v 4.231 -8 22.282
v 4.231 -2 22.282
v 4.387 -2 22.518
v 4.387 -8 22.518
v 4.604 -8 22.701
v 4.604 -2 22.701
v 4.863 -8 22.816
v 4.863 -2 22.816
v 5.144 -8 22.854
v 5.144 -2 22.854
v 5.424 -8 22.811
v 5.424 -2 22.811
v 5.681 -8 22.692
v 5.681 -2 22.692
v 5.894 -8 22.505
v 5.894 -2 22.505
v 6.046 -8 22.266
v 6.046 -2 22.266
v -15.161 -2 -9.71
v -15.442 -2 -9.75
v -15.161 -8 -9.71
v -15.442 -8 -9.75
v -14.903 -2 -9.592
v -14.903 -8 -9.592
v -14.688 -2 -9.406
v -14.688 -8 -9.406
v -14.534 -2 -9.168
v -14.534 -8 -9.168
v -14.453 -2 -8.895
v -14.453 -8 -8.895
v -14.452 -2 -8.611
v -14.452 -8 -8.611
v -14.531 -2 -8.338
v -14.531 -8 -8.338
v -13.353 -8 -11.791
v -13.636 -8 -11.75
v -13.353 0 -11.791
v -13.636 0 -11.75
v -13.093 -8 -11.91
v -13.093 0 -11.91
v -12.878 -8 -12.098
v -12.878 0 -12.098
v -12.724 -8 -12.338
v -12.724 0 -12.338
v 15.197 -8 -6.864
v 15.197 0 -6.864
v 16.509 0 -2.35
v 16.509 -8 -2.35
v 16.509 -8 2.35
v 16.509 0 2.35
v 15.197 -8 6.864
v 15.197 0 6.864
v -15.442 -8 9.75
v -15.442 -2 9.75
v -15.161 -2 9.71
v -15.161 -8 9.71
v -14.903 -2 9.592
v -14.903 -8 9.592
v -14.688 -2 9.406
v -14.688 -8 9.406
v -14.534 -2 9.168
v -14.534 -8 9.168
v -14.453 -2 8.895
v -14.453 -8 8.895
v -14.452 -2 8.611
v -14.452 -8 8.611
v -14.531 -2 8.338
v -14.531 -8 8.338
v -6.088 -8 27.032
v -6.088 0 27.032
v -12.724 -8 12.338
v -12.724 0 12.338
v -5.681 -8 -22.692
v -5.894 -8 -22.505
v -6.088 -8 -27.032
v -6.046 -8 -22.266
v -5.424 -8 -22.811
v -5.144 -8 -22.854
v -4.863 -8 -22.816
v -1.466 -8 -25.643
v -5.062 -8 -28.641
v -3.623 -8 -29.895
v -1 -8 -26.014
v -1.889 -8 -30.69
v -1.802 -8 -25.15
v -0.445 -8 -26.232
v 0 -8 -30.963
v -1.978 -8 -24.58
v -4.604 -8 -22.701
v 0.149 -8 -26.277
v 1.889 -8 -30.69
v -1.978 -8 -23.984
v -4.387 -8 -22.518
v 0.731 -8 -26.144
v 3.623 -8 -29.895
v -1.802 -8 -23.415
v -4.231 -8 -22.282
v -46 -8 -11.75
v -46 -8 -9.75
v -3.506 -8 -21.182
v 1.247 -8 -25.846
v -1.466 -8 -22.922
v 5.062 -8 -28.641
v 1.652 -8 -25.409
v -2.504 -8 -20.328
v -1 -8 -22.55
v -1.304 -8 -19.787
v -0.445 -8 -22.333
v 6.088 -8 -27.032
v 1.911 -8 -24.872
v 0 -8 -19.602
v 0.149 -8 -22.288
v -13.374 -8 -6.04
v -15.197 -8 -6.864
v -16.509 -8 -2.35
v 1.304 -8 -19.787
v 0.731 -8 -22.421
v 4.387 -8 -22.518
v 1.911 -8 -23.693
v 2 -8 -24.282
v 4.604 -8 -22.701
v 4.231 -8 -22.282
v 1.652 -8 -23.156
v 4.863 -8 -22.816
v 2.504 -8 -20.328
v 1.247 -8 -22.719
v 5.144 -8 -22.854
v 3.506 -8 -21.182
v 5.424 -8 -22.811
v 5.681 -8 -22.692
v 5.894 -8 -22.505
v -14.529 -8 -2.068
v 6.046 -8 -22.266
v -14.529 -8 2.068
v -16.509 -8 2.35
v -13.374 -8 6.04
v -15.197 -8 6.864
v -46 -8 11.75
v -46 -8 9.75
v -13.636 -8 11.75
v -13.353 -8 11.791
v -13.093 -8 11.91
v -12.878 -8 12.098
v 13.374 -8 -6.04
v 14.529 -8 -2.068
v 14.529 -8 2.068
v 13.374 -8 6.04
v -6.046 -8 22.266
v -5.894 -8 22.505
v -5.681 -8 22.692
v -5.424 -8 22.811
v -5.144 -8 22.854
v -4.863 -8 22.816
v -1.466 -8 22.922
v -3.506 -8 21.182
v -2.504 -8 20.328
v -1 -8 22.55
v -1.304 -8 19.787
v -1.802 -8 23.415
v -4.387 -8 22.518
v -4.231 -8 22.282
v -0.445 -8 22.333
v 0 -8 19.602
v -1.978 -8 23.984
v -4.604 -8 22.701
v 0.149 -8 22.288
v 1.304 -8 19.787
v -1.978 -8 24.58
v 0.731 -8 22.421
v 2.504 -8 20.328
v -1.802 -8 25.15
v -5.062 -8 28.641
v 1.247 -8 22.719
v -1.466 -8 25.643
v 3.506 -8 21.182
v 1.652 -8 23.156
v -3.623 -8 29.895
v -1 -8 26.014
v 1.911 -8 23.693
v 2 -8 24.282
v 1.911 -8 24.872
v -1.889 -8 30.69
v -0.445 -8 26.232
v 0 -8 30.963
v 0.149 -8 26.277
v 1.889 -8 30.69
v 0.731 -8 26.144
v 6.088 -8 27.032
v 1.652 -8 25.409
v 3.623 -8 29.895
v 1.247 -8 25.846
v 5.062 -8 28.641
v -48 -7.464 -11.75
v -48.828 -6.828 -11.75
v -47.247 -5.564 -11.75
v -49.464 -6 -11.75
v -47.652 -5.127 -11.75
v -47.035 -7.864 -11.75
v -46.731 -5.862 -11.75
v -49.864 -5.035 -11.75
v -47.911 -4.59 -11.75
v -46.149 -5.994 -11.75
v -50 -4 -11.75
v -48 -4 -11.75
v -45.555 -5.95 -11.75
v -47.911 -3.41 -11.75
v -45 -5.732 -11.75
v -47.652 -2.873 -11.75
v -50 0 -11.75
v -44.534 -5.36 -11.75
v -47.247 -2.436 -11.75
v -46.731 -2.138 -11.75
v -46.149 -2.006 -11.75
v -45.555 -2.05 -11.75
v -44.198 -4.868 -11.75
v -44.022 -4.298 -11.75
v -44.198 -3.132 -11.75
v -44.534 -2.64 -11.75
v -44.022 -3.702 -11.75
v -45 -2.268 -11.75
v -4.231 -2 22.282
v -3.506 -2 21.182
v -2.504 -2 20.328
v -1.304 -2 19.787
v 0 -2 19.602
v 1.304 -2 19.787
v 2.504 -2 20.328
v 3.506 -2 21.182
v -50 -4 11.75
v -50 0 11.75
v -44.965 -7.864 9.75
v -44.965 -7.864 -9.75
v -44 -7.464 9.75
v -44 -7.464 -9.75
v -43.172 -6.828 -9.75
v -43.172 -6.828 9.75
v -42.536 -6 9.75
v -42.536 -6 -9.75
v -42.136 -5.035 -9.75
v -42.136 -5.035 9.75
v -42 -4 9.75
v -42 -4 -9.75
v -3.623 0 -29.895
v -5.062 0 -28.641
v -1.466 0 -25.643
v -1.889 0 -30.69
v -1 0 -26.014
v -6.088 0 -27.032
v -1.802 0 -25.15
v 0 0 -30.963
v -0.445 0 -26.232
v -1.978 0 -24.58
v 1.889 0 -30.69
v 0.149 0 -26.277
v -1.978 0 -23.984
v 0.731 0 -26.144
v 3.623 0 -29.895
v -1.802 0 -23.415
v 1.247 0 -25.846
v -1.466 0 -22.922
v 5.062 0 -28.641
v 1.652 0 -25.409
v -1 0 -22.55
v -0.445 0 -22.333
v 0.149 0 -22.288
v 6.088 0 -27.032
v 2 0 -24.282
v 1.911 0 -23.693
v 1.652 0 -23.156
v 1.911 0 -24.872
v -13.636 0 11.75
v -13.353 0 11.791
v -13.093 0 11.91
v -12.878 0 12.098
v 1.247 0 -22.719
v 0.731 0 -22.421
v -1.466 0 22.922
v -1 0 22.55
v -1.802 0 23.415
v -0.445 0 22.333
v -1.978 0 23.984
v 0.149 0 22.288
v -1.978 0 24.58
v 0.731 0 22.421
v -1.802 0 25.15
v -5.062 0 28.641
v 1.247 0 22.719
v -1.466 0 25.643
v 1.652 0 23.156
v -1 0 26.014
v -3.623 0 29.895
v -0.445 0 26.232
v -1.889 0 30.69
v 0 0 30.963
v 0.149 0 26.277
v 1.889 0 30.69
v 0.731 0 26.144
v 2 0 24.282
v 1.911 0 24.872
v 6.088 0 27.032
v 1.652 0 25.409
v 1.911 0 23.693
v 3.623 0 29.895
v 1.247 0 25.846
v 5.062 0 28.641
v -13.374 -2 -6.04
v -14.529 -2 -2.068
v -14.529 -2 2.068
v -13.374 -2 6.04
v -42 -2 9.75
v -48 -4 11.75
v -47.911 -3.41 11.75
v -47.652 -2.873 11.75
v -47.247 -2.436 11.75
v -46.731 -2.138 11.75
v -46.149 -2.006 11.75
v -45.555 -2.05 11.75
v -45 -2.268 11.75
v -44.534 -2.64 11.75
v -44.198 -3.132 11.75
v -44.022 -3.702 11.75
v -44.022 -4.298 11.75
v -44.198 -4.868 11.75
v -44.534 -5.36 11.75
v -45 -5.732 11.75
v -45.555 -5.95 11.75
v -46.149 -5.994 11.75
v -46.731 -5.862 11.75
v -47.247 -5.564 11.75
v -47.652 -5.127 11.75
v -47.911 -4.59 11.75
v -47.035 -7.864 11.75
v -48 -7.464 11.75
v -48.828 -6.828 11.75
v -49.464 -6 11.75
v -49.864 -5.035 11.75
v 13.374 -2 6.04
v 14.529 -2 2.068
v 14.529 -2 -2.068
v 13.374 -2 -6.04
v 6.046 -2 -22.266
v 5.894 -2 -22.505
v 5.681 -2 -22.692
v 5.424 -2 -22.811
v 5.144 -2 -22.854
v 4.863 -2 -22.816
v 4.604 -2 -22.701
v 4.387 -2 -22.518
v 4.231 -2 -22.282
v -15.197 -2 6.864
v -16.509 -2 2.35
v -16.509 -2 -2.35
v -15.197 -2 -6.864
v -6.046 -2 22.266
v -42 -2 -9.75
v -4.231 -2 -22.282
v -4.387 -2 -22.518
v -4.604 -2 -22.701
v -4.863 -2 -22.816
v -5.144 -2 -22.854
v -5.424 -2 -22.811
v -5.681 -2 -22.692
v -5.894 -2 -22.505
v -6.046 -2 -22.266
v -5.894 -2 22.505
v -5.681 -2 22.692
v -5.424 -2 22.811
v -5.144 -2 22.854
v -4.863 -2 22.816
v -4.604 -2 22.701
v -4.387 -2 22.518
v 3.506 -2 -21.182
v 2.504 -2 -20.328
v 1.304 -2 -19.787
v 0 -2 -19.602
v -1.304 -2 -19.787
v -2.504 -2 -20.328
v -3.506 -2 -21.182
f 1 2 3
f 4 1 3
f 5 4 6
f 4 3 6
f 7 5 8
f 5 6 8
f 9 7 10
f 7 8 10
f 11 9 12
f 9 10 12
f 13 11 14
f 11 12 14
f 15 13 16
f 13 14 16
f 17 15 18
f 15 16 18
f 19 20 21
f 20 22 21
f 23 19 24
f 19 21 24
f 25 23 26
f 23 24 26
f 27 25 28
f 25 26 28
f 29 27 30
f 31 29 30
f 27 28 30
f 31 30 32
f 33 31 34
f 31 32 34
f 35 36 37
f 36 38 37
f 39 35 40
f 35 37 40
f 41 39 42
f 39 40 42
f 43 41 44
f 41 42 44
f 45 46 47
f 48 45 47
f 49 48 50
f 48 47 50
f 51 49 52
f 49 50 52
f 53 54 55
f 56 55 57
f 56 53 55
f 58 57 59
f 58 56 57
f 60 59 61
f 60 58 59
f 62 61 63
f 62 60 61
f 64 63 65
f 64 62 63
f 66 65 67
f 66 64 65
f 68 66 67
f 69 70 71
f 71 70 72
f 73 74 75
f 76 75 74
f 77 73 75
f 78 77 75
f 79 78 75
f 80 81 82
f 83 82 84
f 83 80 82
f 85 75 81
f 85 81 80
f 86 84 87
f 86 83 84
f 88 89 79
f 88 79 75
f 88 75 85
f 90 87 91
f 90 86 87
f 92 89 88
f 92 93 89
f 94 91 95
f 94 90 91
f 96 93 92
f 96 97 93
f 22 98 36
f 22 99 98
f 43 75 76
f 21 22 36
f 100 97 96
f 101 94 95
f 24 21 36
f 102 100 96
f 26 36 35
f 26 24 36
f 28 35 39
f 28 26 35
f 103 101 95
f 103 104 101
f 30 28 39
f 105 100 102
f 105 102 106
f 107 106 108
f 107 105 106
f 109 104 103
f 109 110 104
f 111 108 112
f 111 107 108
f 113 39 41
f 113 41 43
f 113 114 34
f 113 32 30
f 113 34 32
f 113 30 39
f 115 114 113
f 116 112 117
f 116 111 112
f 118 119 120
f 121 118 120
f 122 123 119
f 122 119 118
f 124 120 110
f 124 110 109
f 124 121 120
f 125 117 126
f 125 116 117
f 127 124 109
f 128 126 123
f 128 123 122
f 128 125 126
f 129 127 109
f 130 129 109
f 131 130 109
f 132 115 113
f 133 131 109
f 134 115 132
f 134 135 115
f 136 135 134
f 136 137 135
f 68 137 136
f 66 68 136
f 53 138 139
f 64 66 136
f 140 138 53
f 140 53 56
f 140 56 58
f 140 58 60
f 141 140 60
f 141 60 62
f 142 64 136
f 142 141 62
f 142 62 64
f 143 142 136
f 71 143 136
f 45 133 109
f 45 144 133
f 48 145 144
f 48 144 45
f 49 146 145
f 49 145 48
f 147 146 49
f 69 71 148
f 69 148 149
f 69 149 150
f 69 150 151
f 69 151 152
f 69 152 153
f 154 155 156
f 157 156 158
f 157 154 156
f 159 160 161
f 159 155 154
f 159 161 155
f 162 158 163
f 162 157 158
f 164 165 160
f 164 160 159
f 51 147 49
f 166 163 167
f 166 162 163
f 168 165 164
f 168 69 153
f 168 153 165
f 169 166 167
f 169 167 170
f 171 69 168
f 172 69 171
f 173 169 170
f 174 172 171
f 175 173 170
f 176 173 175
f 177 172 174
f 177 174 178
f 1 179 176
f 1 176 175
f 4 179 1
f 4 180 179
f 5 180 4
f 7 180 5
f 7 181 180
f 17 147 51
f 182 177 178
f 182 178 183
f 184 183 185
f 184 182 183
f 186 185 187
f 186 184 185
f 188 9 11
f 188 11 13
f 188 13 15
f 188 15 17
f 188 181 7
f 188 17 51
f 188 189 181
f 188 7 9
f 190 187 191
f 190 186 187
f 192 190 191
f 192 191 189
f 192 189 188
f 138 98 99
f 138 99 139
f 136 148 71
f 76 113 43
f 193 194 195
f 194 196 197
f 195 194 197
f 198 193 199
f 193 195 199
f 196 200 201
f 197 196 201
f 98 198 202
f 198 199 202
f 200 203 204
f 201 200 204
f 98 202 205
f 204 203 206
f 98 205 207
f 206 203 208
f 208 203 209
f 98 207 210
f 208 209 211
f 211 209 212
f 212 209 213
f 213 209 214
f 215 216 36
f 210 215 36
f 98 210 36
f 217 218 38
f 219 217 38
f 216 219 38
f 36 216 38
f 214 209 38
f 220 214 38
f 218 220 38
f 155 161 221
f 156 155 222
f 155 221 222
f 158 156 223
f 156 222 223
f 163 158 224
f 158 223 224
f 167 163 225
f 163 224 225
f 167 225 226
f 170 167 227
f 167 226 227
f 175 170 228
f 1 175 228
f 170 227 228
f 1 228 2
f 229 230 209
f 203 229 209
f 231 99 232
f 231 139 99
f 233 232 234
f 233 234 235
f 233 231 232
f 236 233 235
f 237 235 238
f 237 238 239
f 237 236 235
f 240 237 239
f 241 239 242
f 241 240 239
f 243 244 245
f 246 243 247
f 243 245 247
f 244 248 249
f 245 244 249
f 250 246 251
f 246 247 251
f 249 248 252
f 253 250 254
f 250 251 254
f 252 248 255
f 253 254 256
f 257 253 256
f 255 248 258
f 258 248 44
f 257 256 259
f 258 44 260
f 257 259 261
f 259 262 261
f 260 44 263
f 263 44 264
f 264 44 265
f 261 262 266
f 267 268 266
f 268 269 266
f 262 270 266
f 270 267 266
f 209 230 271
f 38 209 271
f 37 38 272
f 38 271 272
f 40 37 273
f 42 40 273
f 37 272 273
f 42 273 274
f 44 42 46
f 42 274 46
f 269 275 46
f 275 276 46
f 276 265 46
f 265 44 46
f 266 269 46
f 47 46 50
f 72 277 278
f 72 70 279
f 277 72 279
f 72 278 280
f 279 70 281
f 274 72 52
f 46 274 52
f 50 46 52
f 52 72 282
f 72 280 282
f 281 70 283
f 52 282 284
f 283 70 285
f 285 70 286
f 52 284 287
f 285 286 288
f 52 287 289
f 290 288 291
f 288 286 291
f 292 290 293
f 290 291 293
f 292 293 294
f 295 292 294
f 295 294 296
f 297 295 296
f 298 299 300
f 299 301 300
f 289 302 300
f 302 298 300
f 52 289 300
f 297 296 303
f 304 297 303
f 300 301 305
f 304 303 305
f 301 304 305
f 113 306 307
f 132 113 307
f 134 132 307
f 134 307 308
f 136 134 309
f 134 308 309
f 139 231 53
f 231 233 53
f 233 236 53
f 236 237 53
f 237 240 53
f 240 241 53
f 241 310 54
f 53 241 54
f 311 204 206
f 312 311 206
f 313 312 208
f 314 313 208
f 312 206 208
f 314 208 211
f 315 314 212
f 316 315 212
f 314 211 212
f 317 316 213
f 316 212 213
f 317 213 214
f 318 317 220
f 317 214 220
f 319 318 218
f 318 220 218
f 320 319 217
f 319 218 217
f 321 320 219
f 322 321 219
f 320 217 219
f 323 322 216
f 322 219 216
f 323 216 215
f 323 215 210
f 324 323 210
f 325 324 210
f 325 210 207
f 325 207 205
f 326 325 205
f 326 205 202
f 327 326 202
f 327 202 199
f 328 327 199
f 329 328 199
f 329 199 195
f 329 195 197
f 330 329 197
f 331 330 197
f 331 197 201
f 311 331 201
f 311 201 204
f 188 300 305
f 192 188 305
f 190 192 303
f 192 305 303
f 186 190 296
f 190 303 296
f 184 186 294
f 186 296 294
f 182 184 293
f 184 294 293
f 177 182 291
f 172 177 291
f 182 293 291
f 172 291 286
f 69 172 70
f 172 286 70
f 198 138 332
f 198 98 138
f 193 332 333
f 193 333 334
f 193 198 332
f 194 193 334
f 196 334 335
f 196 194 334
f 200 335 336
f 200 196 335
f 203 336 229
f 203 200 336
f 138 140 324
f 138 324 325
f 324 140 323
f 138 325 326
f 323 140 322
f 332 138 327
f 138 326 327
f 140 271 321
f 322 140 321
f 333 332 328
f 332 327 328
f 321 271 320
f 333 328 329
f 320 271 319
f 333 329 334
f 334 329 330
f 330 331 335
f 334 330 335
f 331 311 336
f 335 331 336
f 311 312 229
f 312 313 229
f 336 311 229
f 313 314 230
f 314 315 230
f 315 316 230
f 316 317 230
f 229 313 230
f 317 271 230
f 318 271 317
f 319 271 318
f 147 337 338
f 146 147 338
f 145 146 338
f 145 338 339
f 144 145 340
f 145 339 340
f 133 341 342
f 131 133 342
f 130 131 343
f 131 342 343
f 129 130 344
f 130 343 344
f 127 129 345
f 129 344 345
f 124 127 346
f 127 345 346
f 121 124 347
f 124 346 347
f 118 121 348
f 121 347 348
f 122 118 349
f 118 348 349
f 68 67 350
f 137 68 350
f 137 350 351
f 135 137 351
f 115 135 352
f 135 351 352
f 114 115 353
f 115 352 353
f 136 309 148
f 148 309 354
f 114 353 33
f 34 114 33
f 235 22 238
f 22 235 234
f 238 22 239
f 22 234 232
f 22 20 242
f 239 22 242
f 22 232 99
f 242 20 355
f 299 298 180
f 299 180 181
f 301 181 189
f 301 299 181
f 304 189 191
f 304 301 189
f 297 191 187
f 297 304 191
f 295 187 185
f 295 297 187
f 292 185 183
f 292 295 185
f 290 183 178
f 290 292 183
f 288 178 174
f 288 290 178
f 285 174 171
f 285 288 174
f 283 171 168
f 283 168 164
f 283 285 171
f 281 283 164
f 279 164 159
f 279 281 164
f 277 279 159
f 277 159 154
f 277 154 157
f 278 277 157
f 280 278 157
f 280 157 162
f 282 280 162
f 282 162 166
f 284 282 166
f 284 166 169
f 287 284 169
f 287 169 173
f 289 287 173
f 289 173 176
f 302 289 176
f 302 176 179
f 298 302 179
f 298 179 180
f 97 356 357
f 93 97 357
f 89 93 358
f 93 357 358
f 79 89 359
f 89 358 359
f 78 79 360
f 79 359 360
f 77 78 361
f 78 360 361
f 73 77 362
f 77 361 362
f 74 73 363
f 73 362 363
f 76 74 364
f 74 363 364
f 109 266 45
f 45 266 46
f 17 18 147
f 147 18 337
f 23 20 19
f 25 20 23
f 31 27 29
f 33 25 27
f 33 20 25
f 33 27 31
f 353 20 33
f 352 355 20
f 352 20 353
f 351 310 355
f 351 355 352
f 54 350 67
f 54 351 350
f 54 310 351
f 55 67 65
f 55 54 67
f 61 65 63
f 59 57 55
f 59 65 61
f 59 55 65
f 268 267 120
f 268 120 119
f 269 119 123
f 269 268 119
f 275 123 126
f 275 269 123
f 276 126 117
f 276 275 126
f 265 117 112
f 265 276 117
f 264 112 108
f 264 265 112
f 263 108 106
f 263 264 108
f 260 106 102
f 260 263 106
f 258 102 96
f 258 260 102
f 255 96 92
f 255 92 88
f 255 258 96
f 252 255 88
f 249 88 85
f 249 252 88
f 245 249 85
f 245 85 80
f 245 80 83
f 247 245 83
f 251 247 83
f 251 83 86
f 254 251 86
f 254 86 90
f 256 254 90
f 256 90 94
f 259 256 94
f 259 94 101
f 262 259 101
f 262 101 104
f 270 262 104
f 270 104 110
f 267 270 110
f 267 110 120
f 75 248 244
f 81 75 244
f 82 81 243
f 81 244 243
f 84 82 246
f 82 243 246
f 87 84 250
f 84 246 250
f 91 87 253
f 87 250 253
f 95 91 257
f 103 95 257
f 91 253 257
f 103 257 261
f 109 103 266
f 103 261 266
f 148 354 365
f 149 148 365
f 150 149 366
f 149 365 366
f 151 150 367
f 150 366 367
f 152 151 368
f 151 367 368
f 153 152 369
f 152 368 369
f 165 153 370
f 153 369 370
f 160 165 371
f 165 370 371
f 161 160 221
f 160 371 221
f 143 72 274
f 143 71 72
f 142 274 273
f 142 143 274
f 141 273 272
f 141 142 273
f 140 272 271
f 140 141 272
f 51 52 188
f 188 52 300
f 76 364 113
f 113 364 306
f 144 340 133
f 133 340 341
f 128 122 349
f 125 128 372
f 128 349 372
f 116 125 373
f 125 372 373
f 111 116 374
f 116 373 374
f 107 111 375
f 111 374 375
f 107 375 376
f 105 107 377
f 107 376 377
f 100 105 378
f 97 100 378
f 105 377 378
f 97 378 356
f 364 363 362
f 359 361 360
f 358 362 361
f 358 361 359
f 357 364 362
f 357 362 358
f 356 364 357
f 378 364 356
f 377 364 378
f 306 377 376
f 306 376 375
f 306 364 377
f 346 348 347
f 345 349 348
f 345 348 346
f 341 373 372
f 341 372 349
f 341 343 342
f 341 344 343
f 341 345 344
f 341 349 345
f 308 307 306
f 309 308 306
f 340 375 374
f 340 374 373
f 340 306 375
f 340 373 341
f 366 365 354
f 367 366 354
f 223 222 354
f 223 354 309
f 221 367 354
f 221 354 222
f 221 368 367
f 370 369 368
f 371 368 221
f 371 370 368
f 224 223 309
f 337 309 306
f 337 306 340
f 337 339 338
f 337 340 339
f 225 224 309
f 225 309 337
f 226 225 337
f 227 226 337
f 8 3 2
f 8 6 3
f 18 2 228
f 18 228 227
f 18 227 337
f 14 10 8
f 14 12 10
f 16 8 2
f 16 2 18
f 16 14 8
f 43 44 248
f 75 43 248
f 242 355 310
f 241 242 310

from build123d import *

# Parameters (mm, degrees)
F0_R     = 2
F1_DEPTH = 8
F2_DEPTH = 2
F3_R     = 1
F5_D     = 4
F6_R     = 3.99999


# Not quite as in the source:
# - a fillet or chamfer is up to 0.001 mm smaller than in the source, because OpenCascade refuses the exact size
# - a feature names something its author has since deleted; it is built from what else it names


with BuildPart() as f1:
    # F0 (on Front) → F1 (new body)
    with BuildSketch(Plane.XZ):
        with BuildLine():
            Line((15.1970139668, 6.8636525628), (6.0880650012, 27.0320429916))
            ThreePointArc((6.0880650012, 27.0320429916), (0, 30.9626), (-6.0880650012, 27.0320429916))
            Line((-6.0880650012, 27.0320429916), (-12.9901204821, 11.75))
            Line((-12.9901204821, 11.75), (-13.8934101123, 9.75))
            Line((-13.8934101123, 9.75), (-15.1970139668, 6.8636525628))
            ThreePointArc((-15.1970139668, 6.8636525628), (-16.6751, 0), (-15.1970139668, -6.8636525628))
            Line((-15.1970139668, -6.8636525628), (-13.8934101123, -9.75))
            Line((-13.8934101123, -9.75), (-12.9901204821, -11.75))
            Line((-12.9901204821, -11.75), (-6.0880650012, -27.0320429916))
            ThreePointArc((-6.0880650012, -27.0320429916), (0, -30.9626), (6.0880650012, -27.0320429916))
            Line((6.0880650012, -27.0320429916), (15.1970139668, -6.8636525628))
            ThreePointArc((15.1970139668, -6.8636525628), (16.6751, 0), (15.1970139668, 6.8636525628))
        make_face()
        with Locations((0, -24.2824)):
            Circle(F0_R, mode=Mode.SUBTRACT)
        with BuildLine():
            Line((-13.3742945868, 6.0404308054), (-6.0462846285, 22.2655920687))
            ThreePointArc((-6.0462846285, 22.2655920687), (-5.1436901116, 22.8539427752), (-4.2309206889, 22.2815046593))
            ThreePointArc((-4.2309206889, 22.2815046593), (0, 19.6022), (4.2309206889, 22.2815046593))
            ThreePointArc((4.2309206889, 22.2815046593), (5.1436901116, 22.8539427752), (6.0462846285, 22.2655920687))
            Line((6.0462846285, 22.2655920687), (13.3742945868, 6.0404308054))
            ThreePointArc((13.3742945868, 6.0404308054), (14.6751, 0), (13.3742945868, -6.0404308054))
            Line((13.3742945868, -6.0404308054), (6.0462846285, -22.2655920687))
            ThreePointArc((6.0462846285, -22.2655920687), (5.1436901116, -22.8539427752), (4.2309206889, -22.2815046593))
            ThreePointArc((4.2309206889, -22.2815046593), (0, -19.6022), (-4.2309206889, -22.2815046593))
            ThreePointArc((-4.2309206889, -22.2815046593), (-5.1436901116, -22.8539427752), (-6.0462846285, -22.2655920687))
            Line((-6.0462846285, -22.2655920687), (-13.3742945868, -6.0404308054))
            ThreePointArc((-13.3742945868, -6.0404308054), (-14.6751, 0), (-13.3742945868, 6.0404308054))
        make_face(mode=Mode.SUBTRACT)
        with Locations((0, 24.2824)):
            Circle(F0_R, mode=Mode.SUBTRACT)
        Polygon((-13.8934101123, 9.75), (-12.9901204821, 11.75), (-50, 11.75), (-50, -11.75), (-12.9901204821, -11.75), (-13.8934101123, -9.75), (-42, -9.75), (-42, 9.75), align=None)
    extrude(amount=F1_DEPTH)

    # F0 (on Front) → F2 (join)
    with BuildSketch(Plane.XZ):
        with BuildLine():
            Line((15.1970139668, 6.8636525628), (6.0880650012, 27.0320429916))
            ThreePointArc((6.0880650012, 27.0320429916), (0, 30.9626), (-6.0880650012, 27.0320429916))
            Line((-6.0880650012, 27.0320429916), (-12.9901204821, 11.75))
            Line((-12.9901204821, 11.75), (-13.8934101123, 9.75))
            Line((-13.8934101123, 9.75), (-15.1970139668, 6.8636525628))
            ThreePointArc((-15.1970139668, 6.8636525628), (-16.6751, 0), (-15.1970139668, -6.8636525628))
            Line((-15.1970139668, -6.8636525628), (-13.8934101123, -9.75))
            Line((-13.8934101123, -9.75), (-12.9901204821, -11.75))
            Line((-12.9901204821, -11.75), (-6.0880650012, -27.0320429916))
            ThreePointArc((-6.0880650012, -27.0320429916), (0, -30.9626), (6.0880650012, -27.0320429916))
            Line((6.0880650012, -27.0320429916), (15.1970139668, -6.8636525628))
            ThreePointArc((15.1970139668, -6.8636525628), (16.6751, 0), (15.1970139668, 6.8636525628))
        make_face()
        with Locations((0, -24.2824)):
            Circle(F0_R, mode=Mode.SUBTRACT)
        with BuildLine():
            Line((-13.3742945868, 6.0404308054), (-6.0462846285, 22.2655920687))
            ThreePointArc((-6.0462846285, 22.2655920687), (-5.1436901116, 22.8539427752), (-4.2309206889, 22.2815046593))
            ThreePointArc((-4.2309206889, 22.2815046593), (0, 19.6022), (4.2309206889, 22.2815046593))
            ThreePointArc((4.2309206889, 22.2815046593), (5.1436901116, 22.8539427752), (6.0462846285, 22.2655920687))
            Line((6.0462846285, 22.2655920687), (13.3742945868, 6.0404308054))
            ThreePointArc((13.3742945868, 6.0404308054), (14.6751, 0), (13.3742945868, -6.0404308054))
            Line((13.3742945868, -6.0404308054), (6.0462846285, -22.2655920687))
            ThreePointArc((6.0462846285, -22.2655920687), (5.1436901116, -22.8539427752), (4.2309206889, -22.2815046593))
            ThreePointArc((4.2309206889, -22.2815046593), (0, -19.6022), (-4.2309206889, -22.2815046593))
            ThreePointArc((-4.2309206889, -22.2815046593), (-5.1436901116, -22.8539427752), (-6.0462846285, -22.2655920687))
            Line((-6.0462846285, -22.2655920687), (-13.3742945868, -6.0404308054))
            ThreePointArc((-13.3742945868, -6.0404308054), (-14.6751, 0), (-13.3742945868, 6.0404308054))
        make_face(mode=Mode.SUBTRACT)
        with Locations((0, 24.2824)):
            Circle(F0_R, mode=Mode.SUBTRACT)
        with BuildLine():
            ThreePointArc((-4.2309206889, 22.2815046593), (-5.1436901116, 22.8539427752), (-6.0462846285, 22.2655920687))
            Line((-6.0462846285, 22.2655920687), (-13.3742945868, 6.0404308054))
            ThreePointArc((-13.3742945868, 6.0404308054), (-14.6751, 0), (-13.3742945868, -6.0404308054))
            Line((-13.3742945868, -6.0404308054), (-6.0462846285, -22.2655920687))
            ThreePointArc((-6.0462846285, -22.2655920687), (-5.1436901116, -22.8539427752), (-4.2309206889, -22.2815046593))
            ThreePointArc((-4.2309206889, -22.2815046593), (0, -19.6022), (4.2309206889, -22.2815046593))
            ThreePointArc((4.2309206889, -22.2815046593), (5.1436901116, -22.8539427752), (6.0462846285, -22.2655920687))
            Line((6.0462846285, -22.2655920687), (13.3742945868, -6.0404308054))
            ThreePointArc((13.3742945868, -6.0404308054), (14.6751, 0), (13.3742945868, 6.0404308054))
            Line((13.3742945868, 6.0404308054), (6.0462846285, 22.2655920687))
            ThreePointArc((6.0462846285, 22.2655920687), (5.1436901116, 22.8539427752), (4.2309206889, 22.2815046593))
            ThreePointArc((4.2309206889, 22.2815046593), (0, 19.6022), (-4.2309206889, 22.2815046593))
        make_face()
        with BuildLine():
            Line((-15.1970139668, 6.8636525628), (-13.8934101123, 9.75))
            Line((-13.8934101123, 9.75), (-42, 9.75))
            Line((-42, 9.75), (-42, -9.75))
            Line((-42, -9.75), (-13.8934101123, -9.75))
            Line((-13.8934101123, -9.75), (-15.1970139668, -6.8636525628))
            ThreePointArc((-15.1970139668, -6.8636525628), (-16.6751, 0), (-15.1970139668, 6.8636525628))
        make_face()
    extrude(amount=F2_DEPTH)

    # F3
    f3_edges = [f1.edges().sort_by_distance(p)[0] for p in [
        (-13.89341, -5, -9.75),
        (-12.99012, -4, -11.75),
        (-13.89341, -5, 9.75),
        (-12.99012, -4, 11.75),
    ]]
    fillet(f3_edges, radius=F3_R)

    # F5 (through all)
    with Locations(Plane.XY.offset(11.75)):
        with Locations((-46, -4)):
            Hole(F5_D / 2)

    # F6 (radius 4 in the source; OpenCascade refuses exactly that, so slightly less here)
    f6_edges = [f1.edges().sort_by_distance(p)[0] for p in [
        (-50, -8, 0),
        (-42, -8, 0),
    ]]
    fillet(f6_edges, radius=F6_R)


solid = f1.part
